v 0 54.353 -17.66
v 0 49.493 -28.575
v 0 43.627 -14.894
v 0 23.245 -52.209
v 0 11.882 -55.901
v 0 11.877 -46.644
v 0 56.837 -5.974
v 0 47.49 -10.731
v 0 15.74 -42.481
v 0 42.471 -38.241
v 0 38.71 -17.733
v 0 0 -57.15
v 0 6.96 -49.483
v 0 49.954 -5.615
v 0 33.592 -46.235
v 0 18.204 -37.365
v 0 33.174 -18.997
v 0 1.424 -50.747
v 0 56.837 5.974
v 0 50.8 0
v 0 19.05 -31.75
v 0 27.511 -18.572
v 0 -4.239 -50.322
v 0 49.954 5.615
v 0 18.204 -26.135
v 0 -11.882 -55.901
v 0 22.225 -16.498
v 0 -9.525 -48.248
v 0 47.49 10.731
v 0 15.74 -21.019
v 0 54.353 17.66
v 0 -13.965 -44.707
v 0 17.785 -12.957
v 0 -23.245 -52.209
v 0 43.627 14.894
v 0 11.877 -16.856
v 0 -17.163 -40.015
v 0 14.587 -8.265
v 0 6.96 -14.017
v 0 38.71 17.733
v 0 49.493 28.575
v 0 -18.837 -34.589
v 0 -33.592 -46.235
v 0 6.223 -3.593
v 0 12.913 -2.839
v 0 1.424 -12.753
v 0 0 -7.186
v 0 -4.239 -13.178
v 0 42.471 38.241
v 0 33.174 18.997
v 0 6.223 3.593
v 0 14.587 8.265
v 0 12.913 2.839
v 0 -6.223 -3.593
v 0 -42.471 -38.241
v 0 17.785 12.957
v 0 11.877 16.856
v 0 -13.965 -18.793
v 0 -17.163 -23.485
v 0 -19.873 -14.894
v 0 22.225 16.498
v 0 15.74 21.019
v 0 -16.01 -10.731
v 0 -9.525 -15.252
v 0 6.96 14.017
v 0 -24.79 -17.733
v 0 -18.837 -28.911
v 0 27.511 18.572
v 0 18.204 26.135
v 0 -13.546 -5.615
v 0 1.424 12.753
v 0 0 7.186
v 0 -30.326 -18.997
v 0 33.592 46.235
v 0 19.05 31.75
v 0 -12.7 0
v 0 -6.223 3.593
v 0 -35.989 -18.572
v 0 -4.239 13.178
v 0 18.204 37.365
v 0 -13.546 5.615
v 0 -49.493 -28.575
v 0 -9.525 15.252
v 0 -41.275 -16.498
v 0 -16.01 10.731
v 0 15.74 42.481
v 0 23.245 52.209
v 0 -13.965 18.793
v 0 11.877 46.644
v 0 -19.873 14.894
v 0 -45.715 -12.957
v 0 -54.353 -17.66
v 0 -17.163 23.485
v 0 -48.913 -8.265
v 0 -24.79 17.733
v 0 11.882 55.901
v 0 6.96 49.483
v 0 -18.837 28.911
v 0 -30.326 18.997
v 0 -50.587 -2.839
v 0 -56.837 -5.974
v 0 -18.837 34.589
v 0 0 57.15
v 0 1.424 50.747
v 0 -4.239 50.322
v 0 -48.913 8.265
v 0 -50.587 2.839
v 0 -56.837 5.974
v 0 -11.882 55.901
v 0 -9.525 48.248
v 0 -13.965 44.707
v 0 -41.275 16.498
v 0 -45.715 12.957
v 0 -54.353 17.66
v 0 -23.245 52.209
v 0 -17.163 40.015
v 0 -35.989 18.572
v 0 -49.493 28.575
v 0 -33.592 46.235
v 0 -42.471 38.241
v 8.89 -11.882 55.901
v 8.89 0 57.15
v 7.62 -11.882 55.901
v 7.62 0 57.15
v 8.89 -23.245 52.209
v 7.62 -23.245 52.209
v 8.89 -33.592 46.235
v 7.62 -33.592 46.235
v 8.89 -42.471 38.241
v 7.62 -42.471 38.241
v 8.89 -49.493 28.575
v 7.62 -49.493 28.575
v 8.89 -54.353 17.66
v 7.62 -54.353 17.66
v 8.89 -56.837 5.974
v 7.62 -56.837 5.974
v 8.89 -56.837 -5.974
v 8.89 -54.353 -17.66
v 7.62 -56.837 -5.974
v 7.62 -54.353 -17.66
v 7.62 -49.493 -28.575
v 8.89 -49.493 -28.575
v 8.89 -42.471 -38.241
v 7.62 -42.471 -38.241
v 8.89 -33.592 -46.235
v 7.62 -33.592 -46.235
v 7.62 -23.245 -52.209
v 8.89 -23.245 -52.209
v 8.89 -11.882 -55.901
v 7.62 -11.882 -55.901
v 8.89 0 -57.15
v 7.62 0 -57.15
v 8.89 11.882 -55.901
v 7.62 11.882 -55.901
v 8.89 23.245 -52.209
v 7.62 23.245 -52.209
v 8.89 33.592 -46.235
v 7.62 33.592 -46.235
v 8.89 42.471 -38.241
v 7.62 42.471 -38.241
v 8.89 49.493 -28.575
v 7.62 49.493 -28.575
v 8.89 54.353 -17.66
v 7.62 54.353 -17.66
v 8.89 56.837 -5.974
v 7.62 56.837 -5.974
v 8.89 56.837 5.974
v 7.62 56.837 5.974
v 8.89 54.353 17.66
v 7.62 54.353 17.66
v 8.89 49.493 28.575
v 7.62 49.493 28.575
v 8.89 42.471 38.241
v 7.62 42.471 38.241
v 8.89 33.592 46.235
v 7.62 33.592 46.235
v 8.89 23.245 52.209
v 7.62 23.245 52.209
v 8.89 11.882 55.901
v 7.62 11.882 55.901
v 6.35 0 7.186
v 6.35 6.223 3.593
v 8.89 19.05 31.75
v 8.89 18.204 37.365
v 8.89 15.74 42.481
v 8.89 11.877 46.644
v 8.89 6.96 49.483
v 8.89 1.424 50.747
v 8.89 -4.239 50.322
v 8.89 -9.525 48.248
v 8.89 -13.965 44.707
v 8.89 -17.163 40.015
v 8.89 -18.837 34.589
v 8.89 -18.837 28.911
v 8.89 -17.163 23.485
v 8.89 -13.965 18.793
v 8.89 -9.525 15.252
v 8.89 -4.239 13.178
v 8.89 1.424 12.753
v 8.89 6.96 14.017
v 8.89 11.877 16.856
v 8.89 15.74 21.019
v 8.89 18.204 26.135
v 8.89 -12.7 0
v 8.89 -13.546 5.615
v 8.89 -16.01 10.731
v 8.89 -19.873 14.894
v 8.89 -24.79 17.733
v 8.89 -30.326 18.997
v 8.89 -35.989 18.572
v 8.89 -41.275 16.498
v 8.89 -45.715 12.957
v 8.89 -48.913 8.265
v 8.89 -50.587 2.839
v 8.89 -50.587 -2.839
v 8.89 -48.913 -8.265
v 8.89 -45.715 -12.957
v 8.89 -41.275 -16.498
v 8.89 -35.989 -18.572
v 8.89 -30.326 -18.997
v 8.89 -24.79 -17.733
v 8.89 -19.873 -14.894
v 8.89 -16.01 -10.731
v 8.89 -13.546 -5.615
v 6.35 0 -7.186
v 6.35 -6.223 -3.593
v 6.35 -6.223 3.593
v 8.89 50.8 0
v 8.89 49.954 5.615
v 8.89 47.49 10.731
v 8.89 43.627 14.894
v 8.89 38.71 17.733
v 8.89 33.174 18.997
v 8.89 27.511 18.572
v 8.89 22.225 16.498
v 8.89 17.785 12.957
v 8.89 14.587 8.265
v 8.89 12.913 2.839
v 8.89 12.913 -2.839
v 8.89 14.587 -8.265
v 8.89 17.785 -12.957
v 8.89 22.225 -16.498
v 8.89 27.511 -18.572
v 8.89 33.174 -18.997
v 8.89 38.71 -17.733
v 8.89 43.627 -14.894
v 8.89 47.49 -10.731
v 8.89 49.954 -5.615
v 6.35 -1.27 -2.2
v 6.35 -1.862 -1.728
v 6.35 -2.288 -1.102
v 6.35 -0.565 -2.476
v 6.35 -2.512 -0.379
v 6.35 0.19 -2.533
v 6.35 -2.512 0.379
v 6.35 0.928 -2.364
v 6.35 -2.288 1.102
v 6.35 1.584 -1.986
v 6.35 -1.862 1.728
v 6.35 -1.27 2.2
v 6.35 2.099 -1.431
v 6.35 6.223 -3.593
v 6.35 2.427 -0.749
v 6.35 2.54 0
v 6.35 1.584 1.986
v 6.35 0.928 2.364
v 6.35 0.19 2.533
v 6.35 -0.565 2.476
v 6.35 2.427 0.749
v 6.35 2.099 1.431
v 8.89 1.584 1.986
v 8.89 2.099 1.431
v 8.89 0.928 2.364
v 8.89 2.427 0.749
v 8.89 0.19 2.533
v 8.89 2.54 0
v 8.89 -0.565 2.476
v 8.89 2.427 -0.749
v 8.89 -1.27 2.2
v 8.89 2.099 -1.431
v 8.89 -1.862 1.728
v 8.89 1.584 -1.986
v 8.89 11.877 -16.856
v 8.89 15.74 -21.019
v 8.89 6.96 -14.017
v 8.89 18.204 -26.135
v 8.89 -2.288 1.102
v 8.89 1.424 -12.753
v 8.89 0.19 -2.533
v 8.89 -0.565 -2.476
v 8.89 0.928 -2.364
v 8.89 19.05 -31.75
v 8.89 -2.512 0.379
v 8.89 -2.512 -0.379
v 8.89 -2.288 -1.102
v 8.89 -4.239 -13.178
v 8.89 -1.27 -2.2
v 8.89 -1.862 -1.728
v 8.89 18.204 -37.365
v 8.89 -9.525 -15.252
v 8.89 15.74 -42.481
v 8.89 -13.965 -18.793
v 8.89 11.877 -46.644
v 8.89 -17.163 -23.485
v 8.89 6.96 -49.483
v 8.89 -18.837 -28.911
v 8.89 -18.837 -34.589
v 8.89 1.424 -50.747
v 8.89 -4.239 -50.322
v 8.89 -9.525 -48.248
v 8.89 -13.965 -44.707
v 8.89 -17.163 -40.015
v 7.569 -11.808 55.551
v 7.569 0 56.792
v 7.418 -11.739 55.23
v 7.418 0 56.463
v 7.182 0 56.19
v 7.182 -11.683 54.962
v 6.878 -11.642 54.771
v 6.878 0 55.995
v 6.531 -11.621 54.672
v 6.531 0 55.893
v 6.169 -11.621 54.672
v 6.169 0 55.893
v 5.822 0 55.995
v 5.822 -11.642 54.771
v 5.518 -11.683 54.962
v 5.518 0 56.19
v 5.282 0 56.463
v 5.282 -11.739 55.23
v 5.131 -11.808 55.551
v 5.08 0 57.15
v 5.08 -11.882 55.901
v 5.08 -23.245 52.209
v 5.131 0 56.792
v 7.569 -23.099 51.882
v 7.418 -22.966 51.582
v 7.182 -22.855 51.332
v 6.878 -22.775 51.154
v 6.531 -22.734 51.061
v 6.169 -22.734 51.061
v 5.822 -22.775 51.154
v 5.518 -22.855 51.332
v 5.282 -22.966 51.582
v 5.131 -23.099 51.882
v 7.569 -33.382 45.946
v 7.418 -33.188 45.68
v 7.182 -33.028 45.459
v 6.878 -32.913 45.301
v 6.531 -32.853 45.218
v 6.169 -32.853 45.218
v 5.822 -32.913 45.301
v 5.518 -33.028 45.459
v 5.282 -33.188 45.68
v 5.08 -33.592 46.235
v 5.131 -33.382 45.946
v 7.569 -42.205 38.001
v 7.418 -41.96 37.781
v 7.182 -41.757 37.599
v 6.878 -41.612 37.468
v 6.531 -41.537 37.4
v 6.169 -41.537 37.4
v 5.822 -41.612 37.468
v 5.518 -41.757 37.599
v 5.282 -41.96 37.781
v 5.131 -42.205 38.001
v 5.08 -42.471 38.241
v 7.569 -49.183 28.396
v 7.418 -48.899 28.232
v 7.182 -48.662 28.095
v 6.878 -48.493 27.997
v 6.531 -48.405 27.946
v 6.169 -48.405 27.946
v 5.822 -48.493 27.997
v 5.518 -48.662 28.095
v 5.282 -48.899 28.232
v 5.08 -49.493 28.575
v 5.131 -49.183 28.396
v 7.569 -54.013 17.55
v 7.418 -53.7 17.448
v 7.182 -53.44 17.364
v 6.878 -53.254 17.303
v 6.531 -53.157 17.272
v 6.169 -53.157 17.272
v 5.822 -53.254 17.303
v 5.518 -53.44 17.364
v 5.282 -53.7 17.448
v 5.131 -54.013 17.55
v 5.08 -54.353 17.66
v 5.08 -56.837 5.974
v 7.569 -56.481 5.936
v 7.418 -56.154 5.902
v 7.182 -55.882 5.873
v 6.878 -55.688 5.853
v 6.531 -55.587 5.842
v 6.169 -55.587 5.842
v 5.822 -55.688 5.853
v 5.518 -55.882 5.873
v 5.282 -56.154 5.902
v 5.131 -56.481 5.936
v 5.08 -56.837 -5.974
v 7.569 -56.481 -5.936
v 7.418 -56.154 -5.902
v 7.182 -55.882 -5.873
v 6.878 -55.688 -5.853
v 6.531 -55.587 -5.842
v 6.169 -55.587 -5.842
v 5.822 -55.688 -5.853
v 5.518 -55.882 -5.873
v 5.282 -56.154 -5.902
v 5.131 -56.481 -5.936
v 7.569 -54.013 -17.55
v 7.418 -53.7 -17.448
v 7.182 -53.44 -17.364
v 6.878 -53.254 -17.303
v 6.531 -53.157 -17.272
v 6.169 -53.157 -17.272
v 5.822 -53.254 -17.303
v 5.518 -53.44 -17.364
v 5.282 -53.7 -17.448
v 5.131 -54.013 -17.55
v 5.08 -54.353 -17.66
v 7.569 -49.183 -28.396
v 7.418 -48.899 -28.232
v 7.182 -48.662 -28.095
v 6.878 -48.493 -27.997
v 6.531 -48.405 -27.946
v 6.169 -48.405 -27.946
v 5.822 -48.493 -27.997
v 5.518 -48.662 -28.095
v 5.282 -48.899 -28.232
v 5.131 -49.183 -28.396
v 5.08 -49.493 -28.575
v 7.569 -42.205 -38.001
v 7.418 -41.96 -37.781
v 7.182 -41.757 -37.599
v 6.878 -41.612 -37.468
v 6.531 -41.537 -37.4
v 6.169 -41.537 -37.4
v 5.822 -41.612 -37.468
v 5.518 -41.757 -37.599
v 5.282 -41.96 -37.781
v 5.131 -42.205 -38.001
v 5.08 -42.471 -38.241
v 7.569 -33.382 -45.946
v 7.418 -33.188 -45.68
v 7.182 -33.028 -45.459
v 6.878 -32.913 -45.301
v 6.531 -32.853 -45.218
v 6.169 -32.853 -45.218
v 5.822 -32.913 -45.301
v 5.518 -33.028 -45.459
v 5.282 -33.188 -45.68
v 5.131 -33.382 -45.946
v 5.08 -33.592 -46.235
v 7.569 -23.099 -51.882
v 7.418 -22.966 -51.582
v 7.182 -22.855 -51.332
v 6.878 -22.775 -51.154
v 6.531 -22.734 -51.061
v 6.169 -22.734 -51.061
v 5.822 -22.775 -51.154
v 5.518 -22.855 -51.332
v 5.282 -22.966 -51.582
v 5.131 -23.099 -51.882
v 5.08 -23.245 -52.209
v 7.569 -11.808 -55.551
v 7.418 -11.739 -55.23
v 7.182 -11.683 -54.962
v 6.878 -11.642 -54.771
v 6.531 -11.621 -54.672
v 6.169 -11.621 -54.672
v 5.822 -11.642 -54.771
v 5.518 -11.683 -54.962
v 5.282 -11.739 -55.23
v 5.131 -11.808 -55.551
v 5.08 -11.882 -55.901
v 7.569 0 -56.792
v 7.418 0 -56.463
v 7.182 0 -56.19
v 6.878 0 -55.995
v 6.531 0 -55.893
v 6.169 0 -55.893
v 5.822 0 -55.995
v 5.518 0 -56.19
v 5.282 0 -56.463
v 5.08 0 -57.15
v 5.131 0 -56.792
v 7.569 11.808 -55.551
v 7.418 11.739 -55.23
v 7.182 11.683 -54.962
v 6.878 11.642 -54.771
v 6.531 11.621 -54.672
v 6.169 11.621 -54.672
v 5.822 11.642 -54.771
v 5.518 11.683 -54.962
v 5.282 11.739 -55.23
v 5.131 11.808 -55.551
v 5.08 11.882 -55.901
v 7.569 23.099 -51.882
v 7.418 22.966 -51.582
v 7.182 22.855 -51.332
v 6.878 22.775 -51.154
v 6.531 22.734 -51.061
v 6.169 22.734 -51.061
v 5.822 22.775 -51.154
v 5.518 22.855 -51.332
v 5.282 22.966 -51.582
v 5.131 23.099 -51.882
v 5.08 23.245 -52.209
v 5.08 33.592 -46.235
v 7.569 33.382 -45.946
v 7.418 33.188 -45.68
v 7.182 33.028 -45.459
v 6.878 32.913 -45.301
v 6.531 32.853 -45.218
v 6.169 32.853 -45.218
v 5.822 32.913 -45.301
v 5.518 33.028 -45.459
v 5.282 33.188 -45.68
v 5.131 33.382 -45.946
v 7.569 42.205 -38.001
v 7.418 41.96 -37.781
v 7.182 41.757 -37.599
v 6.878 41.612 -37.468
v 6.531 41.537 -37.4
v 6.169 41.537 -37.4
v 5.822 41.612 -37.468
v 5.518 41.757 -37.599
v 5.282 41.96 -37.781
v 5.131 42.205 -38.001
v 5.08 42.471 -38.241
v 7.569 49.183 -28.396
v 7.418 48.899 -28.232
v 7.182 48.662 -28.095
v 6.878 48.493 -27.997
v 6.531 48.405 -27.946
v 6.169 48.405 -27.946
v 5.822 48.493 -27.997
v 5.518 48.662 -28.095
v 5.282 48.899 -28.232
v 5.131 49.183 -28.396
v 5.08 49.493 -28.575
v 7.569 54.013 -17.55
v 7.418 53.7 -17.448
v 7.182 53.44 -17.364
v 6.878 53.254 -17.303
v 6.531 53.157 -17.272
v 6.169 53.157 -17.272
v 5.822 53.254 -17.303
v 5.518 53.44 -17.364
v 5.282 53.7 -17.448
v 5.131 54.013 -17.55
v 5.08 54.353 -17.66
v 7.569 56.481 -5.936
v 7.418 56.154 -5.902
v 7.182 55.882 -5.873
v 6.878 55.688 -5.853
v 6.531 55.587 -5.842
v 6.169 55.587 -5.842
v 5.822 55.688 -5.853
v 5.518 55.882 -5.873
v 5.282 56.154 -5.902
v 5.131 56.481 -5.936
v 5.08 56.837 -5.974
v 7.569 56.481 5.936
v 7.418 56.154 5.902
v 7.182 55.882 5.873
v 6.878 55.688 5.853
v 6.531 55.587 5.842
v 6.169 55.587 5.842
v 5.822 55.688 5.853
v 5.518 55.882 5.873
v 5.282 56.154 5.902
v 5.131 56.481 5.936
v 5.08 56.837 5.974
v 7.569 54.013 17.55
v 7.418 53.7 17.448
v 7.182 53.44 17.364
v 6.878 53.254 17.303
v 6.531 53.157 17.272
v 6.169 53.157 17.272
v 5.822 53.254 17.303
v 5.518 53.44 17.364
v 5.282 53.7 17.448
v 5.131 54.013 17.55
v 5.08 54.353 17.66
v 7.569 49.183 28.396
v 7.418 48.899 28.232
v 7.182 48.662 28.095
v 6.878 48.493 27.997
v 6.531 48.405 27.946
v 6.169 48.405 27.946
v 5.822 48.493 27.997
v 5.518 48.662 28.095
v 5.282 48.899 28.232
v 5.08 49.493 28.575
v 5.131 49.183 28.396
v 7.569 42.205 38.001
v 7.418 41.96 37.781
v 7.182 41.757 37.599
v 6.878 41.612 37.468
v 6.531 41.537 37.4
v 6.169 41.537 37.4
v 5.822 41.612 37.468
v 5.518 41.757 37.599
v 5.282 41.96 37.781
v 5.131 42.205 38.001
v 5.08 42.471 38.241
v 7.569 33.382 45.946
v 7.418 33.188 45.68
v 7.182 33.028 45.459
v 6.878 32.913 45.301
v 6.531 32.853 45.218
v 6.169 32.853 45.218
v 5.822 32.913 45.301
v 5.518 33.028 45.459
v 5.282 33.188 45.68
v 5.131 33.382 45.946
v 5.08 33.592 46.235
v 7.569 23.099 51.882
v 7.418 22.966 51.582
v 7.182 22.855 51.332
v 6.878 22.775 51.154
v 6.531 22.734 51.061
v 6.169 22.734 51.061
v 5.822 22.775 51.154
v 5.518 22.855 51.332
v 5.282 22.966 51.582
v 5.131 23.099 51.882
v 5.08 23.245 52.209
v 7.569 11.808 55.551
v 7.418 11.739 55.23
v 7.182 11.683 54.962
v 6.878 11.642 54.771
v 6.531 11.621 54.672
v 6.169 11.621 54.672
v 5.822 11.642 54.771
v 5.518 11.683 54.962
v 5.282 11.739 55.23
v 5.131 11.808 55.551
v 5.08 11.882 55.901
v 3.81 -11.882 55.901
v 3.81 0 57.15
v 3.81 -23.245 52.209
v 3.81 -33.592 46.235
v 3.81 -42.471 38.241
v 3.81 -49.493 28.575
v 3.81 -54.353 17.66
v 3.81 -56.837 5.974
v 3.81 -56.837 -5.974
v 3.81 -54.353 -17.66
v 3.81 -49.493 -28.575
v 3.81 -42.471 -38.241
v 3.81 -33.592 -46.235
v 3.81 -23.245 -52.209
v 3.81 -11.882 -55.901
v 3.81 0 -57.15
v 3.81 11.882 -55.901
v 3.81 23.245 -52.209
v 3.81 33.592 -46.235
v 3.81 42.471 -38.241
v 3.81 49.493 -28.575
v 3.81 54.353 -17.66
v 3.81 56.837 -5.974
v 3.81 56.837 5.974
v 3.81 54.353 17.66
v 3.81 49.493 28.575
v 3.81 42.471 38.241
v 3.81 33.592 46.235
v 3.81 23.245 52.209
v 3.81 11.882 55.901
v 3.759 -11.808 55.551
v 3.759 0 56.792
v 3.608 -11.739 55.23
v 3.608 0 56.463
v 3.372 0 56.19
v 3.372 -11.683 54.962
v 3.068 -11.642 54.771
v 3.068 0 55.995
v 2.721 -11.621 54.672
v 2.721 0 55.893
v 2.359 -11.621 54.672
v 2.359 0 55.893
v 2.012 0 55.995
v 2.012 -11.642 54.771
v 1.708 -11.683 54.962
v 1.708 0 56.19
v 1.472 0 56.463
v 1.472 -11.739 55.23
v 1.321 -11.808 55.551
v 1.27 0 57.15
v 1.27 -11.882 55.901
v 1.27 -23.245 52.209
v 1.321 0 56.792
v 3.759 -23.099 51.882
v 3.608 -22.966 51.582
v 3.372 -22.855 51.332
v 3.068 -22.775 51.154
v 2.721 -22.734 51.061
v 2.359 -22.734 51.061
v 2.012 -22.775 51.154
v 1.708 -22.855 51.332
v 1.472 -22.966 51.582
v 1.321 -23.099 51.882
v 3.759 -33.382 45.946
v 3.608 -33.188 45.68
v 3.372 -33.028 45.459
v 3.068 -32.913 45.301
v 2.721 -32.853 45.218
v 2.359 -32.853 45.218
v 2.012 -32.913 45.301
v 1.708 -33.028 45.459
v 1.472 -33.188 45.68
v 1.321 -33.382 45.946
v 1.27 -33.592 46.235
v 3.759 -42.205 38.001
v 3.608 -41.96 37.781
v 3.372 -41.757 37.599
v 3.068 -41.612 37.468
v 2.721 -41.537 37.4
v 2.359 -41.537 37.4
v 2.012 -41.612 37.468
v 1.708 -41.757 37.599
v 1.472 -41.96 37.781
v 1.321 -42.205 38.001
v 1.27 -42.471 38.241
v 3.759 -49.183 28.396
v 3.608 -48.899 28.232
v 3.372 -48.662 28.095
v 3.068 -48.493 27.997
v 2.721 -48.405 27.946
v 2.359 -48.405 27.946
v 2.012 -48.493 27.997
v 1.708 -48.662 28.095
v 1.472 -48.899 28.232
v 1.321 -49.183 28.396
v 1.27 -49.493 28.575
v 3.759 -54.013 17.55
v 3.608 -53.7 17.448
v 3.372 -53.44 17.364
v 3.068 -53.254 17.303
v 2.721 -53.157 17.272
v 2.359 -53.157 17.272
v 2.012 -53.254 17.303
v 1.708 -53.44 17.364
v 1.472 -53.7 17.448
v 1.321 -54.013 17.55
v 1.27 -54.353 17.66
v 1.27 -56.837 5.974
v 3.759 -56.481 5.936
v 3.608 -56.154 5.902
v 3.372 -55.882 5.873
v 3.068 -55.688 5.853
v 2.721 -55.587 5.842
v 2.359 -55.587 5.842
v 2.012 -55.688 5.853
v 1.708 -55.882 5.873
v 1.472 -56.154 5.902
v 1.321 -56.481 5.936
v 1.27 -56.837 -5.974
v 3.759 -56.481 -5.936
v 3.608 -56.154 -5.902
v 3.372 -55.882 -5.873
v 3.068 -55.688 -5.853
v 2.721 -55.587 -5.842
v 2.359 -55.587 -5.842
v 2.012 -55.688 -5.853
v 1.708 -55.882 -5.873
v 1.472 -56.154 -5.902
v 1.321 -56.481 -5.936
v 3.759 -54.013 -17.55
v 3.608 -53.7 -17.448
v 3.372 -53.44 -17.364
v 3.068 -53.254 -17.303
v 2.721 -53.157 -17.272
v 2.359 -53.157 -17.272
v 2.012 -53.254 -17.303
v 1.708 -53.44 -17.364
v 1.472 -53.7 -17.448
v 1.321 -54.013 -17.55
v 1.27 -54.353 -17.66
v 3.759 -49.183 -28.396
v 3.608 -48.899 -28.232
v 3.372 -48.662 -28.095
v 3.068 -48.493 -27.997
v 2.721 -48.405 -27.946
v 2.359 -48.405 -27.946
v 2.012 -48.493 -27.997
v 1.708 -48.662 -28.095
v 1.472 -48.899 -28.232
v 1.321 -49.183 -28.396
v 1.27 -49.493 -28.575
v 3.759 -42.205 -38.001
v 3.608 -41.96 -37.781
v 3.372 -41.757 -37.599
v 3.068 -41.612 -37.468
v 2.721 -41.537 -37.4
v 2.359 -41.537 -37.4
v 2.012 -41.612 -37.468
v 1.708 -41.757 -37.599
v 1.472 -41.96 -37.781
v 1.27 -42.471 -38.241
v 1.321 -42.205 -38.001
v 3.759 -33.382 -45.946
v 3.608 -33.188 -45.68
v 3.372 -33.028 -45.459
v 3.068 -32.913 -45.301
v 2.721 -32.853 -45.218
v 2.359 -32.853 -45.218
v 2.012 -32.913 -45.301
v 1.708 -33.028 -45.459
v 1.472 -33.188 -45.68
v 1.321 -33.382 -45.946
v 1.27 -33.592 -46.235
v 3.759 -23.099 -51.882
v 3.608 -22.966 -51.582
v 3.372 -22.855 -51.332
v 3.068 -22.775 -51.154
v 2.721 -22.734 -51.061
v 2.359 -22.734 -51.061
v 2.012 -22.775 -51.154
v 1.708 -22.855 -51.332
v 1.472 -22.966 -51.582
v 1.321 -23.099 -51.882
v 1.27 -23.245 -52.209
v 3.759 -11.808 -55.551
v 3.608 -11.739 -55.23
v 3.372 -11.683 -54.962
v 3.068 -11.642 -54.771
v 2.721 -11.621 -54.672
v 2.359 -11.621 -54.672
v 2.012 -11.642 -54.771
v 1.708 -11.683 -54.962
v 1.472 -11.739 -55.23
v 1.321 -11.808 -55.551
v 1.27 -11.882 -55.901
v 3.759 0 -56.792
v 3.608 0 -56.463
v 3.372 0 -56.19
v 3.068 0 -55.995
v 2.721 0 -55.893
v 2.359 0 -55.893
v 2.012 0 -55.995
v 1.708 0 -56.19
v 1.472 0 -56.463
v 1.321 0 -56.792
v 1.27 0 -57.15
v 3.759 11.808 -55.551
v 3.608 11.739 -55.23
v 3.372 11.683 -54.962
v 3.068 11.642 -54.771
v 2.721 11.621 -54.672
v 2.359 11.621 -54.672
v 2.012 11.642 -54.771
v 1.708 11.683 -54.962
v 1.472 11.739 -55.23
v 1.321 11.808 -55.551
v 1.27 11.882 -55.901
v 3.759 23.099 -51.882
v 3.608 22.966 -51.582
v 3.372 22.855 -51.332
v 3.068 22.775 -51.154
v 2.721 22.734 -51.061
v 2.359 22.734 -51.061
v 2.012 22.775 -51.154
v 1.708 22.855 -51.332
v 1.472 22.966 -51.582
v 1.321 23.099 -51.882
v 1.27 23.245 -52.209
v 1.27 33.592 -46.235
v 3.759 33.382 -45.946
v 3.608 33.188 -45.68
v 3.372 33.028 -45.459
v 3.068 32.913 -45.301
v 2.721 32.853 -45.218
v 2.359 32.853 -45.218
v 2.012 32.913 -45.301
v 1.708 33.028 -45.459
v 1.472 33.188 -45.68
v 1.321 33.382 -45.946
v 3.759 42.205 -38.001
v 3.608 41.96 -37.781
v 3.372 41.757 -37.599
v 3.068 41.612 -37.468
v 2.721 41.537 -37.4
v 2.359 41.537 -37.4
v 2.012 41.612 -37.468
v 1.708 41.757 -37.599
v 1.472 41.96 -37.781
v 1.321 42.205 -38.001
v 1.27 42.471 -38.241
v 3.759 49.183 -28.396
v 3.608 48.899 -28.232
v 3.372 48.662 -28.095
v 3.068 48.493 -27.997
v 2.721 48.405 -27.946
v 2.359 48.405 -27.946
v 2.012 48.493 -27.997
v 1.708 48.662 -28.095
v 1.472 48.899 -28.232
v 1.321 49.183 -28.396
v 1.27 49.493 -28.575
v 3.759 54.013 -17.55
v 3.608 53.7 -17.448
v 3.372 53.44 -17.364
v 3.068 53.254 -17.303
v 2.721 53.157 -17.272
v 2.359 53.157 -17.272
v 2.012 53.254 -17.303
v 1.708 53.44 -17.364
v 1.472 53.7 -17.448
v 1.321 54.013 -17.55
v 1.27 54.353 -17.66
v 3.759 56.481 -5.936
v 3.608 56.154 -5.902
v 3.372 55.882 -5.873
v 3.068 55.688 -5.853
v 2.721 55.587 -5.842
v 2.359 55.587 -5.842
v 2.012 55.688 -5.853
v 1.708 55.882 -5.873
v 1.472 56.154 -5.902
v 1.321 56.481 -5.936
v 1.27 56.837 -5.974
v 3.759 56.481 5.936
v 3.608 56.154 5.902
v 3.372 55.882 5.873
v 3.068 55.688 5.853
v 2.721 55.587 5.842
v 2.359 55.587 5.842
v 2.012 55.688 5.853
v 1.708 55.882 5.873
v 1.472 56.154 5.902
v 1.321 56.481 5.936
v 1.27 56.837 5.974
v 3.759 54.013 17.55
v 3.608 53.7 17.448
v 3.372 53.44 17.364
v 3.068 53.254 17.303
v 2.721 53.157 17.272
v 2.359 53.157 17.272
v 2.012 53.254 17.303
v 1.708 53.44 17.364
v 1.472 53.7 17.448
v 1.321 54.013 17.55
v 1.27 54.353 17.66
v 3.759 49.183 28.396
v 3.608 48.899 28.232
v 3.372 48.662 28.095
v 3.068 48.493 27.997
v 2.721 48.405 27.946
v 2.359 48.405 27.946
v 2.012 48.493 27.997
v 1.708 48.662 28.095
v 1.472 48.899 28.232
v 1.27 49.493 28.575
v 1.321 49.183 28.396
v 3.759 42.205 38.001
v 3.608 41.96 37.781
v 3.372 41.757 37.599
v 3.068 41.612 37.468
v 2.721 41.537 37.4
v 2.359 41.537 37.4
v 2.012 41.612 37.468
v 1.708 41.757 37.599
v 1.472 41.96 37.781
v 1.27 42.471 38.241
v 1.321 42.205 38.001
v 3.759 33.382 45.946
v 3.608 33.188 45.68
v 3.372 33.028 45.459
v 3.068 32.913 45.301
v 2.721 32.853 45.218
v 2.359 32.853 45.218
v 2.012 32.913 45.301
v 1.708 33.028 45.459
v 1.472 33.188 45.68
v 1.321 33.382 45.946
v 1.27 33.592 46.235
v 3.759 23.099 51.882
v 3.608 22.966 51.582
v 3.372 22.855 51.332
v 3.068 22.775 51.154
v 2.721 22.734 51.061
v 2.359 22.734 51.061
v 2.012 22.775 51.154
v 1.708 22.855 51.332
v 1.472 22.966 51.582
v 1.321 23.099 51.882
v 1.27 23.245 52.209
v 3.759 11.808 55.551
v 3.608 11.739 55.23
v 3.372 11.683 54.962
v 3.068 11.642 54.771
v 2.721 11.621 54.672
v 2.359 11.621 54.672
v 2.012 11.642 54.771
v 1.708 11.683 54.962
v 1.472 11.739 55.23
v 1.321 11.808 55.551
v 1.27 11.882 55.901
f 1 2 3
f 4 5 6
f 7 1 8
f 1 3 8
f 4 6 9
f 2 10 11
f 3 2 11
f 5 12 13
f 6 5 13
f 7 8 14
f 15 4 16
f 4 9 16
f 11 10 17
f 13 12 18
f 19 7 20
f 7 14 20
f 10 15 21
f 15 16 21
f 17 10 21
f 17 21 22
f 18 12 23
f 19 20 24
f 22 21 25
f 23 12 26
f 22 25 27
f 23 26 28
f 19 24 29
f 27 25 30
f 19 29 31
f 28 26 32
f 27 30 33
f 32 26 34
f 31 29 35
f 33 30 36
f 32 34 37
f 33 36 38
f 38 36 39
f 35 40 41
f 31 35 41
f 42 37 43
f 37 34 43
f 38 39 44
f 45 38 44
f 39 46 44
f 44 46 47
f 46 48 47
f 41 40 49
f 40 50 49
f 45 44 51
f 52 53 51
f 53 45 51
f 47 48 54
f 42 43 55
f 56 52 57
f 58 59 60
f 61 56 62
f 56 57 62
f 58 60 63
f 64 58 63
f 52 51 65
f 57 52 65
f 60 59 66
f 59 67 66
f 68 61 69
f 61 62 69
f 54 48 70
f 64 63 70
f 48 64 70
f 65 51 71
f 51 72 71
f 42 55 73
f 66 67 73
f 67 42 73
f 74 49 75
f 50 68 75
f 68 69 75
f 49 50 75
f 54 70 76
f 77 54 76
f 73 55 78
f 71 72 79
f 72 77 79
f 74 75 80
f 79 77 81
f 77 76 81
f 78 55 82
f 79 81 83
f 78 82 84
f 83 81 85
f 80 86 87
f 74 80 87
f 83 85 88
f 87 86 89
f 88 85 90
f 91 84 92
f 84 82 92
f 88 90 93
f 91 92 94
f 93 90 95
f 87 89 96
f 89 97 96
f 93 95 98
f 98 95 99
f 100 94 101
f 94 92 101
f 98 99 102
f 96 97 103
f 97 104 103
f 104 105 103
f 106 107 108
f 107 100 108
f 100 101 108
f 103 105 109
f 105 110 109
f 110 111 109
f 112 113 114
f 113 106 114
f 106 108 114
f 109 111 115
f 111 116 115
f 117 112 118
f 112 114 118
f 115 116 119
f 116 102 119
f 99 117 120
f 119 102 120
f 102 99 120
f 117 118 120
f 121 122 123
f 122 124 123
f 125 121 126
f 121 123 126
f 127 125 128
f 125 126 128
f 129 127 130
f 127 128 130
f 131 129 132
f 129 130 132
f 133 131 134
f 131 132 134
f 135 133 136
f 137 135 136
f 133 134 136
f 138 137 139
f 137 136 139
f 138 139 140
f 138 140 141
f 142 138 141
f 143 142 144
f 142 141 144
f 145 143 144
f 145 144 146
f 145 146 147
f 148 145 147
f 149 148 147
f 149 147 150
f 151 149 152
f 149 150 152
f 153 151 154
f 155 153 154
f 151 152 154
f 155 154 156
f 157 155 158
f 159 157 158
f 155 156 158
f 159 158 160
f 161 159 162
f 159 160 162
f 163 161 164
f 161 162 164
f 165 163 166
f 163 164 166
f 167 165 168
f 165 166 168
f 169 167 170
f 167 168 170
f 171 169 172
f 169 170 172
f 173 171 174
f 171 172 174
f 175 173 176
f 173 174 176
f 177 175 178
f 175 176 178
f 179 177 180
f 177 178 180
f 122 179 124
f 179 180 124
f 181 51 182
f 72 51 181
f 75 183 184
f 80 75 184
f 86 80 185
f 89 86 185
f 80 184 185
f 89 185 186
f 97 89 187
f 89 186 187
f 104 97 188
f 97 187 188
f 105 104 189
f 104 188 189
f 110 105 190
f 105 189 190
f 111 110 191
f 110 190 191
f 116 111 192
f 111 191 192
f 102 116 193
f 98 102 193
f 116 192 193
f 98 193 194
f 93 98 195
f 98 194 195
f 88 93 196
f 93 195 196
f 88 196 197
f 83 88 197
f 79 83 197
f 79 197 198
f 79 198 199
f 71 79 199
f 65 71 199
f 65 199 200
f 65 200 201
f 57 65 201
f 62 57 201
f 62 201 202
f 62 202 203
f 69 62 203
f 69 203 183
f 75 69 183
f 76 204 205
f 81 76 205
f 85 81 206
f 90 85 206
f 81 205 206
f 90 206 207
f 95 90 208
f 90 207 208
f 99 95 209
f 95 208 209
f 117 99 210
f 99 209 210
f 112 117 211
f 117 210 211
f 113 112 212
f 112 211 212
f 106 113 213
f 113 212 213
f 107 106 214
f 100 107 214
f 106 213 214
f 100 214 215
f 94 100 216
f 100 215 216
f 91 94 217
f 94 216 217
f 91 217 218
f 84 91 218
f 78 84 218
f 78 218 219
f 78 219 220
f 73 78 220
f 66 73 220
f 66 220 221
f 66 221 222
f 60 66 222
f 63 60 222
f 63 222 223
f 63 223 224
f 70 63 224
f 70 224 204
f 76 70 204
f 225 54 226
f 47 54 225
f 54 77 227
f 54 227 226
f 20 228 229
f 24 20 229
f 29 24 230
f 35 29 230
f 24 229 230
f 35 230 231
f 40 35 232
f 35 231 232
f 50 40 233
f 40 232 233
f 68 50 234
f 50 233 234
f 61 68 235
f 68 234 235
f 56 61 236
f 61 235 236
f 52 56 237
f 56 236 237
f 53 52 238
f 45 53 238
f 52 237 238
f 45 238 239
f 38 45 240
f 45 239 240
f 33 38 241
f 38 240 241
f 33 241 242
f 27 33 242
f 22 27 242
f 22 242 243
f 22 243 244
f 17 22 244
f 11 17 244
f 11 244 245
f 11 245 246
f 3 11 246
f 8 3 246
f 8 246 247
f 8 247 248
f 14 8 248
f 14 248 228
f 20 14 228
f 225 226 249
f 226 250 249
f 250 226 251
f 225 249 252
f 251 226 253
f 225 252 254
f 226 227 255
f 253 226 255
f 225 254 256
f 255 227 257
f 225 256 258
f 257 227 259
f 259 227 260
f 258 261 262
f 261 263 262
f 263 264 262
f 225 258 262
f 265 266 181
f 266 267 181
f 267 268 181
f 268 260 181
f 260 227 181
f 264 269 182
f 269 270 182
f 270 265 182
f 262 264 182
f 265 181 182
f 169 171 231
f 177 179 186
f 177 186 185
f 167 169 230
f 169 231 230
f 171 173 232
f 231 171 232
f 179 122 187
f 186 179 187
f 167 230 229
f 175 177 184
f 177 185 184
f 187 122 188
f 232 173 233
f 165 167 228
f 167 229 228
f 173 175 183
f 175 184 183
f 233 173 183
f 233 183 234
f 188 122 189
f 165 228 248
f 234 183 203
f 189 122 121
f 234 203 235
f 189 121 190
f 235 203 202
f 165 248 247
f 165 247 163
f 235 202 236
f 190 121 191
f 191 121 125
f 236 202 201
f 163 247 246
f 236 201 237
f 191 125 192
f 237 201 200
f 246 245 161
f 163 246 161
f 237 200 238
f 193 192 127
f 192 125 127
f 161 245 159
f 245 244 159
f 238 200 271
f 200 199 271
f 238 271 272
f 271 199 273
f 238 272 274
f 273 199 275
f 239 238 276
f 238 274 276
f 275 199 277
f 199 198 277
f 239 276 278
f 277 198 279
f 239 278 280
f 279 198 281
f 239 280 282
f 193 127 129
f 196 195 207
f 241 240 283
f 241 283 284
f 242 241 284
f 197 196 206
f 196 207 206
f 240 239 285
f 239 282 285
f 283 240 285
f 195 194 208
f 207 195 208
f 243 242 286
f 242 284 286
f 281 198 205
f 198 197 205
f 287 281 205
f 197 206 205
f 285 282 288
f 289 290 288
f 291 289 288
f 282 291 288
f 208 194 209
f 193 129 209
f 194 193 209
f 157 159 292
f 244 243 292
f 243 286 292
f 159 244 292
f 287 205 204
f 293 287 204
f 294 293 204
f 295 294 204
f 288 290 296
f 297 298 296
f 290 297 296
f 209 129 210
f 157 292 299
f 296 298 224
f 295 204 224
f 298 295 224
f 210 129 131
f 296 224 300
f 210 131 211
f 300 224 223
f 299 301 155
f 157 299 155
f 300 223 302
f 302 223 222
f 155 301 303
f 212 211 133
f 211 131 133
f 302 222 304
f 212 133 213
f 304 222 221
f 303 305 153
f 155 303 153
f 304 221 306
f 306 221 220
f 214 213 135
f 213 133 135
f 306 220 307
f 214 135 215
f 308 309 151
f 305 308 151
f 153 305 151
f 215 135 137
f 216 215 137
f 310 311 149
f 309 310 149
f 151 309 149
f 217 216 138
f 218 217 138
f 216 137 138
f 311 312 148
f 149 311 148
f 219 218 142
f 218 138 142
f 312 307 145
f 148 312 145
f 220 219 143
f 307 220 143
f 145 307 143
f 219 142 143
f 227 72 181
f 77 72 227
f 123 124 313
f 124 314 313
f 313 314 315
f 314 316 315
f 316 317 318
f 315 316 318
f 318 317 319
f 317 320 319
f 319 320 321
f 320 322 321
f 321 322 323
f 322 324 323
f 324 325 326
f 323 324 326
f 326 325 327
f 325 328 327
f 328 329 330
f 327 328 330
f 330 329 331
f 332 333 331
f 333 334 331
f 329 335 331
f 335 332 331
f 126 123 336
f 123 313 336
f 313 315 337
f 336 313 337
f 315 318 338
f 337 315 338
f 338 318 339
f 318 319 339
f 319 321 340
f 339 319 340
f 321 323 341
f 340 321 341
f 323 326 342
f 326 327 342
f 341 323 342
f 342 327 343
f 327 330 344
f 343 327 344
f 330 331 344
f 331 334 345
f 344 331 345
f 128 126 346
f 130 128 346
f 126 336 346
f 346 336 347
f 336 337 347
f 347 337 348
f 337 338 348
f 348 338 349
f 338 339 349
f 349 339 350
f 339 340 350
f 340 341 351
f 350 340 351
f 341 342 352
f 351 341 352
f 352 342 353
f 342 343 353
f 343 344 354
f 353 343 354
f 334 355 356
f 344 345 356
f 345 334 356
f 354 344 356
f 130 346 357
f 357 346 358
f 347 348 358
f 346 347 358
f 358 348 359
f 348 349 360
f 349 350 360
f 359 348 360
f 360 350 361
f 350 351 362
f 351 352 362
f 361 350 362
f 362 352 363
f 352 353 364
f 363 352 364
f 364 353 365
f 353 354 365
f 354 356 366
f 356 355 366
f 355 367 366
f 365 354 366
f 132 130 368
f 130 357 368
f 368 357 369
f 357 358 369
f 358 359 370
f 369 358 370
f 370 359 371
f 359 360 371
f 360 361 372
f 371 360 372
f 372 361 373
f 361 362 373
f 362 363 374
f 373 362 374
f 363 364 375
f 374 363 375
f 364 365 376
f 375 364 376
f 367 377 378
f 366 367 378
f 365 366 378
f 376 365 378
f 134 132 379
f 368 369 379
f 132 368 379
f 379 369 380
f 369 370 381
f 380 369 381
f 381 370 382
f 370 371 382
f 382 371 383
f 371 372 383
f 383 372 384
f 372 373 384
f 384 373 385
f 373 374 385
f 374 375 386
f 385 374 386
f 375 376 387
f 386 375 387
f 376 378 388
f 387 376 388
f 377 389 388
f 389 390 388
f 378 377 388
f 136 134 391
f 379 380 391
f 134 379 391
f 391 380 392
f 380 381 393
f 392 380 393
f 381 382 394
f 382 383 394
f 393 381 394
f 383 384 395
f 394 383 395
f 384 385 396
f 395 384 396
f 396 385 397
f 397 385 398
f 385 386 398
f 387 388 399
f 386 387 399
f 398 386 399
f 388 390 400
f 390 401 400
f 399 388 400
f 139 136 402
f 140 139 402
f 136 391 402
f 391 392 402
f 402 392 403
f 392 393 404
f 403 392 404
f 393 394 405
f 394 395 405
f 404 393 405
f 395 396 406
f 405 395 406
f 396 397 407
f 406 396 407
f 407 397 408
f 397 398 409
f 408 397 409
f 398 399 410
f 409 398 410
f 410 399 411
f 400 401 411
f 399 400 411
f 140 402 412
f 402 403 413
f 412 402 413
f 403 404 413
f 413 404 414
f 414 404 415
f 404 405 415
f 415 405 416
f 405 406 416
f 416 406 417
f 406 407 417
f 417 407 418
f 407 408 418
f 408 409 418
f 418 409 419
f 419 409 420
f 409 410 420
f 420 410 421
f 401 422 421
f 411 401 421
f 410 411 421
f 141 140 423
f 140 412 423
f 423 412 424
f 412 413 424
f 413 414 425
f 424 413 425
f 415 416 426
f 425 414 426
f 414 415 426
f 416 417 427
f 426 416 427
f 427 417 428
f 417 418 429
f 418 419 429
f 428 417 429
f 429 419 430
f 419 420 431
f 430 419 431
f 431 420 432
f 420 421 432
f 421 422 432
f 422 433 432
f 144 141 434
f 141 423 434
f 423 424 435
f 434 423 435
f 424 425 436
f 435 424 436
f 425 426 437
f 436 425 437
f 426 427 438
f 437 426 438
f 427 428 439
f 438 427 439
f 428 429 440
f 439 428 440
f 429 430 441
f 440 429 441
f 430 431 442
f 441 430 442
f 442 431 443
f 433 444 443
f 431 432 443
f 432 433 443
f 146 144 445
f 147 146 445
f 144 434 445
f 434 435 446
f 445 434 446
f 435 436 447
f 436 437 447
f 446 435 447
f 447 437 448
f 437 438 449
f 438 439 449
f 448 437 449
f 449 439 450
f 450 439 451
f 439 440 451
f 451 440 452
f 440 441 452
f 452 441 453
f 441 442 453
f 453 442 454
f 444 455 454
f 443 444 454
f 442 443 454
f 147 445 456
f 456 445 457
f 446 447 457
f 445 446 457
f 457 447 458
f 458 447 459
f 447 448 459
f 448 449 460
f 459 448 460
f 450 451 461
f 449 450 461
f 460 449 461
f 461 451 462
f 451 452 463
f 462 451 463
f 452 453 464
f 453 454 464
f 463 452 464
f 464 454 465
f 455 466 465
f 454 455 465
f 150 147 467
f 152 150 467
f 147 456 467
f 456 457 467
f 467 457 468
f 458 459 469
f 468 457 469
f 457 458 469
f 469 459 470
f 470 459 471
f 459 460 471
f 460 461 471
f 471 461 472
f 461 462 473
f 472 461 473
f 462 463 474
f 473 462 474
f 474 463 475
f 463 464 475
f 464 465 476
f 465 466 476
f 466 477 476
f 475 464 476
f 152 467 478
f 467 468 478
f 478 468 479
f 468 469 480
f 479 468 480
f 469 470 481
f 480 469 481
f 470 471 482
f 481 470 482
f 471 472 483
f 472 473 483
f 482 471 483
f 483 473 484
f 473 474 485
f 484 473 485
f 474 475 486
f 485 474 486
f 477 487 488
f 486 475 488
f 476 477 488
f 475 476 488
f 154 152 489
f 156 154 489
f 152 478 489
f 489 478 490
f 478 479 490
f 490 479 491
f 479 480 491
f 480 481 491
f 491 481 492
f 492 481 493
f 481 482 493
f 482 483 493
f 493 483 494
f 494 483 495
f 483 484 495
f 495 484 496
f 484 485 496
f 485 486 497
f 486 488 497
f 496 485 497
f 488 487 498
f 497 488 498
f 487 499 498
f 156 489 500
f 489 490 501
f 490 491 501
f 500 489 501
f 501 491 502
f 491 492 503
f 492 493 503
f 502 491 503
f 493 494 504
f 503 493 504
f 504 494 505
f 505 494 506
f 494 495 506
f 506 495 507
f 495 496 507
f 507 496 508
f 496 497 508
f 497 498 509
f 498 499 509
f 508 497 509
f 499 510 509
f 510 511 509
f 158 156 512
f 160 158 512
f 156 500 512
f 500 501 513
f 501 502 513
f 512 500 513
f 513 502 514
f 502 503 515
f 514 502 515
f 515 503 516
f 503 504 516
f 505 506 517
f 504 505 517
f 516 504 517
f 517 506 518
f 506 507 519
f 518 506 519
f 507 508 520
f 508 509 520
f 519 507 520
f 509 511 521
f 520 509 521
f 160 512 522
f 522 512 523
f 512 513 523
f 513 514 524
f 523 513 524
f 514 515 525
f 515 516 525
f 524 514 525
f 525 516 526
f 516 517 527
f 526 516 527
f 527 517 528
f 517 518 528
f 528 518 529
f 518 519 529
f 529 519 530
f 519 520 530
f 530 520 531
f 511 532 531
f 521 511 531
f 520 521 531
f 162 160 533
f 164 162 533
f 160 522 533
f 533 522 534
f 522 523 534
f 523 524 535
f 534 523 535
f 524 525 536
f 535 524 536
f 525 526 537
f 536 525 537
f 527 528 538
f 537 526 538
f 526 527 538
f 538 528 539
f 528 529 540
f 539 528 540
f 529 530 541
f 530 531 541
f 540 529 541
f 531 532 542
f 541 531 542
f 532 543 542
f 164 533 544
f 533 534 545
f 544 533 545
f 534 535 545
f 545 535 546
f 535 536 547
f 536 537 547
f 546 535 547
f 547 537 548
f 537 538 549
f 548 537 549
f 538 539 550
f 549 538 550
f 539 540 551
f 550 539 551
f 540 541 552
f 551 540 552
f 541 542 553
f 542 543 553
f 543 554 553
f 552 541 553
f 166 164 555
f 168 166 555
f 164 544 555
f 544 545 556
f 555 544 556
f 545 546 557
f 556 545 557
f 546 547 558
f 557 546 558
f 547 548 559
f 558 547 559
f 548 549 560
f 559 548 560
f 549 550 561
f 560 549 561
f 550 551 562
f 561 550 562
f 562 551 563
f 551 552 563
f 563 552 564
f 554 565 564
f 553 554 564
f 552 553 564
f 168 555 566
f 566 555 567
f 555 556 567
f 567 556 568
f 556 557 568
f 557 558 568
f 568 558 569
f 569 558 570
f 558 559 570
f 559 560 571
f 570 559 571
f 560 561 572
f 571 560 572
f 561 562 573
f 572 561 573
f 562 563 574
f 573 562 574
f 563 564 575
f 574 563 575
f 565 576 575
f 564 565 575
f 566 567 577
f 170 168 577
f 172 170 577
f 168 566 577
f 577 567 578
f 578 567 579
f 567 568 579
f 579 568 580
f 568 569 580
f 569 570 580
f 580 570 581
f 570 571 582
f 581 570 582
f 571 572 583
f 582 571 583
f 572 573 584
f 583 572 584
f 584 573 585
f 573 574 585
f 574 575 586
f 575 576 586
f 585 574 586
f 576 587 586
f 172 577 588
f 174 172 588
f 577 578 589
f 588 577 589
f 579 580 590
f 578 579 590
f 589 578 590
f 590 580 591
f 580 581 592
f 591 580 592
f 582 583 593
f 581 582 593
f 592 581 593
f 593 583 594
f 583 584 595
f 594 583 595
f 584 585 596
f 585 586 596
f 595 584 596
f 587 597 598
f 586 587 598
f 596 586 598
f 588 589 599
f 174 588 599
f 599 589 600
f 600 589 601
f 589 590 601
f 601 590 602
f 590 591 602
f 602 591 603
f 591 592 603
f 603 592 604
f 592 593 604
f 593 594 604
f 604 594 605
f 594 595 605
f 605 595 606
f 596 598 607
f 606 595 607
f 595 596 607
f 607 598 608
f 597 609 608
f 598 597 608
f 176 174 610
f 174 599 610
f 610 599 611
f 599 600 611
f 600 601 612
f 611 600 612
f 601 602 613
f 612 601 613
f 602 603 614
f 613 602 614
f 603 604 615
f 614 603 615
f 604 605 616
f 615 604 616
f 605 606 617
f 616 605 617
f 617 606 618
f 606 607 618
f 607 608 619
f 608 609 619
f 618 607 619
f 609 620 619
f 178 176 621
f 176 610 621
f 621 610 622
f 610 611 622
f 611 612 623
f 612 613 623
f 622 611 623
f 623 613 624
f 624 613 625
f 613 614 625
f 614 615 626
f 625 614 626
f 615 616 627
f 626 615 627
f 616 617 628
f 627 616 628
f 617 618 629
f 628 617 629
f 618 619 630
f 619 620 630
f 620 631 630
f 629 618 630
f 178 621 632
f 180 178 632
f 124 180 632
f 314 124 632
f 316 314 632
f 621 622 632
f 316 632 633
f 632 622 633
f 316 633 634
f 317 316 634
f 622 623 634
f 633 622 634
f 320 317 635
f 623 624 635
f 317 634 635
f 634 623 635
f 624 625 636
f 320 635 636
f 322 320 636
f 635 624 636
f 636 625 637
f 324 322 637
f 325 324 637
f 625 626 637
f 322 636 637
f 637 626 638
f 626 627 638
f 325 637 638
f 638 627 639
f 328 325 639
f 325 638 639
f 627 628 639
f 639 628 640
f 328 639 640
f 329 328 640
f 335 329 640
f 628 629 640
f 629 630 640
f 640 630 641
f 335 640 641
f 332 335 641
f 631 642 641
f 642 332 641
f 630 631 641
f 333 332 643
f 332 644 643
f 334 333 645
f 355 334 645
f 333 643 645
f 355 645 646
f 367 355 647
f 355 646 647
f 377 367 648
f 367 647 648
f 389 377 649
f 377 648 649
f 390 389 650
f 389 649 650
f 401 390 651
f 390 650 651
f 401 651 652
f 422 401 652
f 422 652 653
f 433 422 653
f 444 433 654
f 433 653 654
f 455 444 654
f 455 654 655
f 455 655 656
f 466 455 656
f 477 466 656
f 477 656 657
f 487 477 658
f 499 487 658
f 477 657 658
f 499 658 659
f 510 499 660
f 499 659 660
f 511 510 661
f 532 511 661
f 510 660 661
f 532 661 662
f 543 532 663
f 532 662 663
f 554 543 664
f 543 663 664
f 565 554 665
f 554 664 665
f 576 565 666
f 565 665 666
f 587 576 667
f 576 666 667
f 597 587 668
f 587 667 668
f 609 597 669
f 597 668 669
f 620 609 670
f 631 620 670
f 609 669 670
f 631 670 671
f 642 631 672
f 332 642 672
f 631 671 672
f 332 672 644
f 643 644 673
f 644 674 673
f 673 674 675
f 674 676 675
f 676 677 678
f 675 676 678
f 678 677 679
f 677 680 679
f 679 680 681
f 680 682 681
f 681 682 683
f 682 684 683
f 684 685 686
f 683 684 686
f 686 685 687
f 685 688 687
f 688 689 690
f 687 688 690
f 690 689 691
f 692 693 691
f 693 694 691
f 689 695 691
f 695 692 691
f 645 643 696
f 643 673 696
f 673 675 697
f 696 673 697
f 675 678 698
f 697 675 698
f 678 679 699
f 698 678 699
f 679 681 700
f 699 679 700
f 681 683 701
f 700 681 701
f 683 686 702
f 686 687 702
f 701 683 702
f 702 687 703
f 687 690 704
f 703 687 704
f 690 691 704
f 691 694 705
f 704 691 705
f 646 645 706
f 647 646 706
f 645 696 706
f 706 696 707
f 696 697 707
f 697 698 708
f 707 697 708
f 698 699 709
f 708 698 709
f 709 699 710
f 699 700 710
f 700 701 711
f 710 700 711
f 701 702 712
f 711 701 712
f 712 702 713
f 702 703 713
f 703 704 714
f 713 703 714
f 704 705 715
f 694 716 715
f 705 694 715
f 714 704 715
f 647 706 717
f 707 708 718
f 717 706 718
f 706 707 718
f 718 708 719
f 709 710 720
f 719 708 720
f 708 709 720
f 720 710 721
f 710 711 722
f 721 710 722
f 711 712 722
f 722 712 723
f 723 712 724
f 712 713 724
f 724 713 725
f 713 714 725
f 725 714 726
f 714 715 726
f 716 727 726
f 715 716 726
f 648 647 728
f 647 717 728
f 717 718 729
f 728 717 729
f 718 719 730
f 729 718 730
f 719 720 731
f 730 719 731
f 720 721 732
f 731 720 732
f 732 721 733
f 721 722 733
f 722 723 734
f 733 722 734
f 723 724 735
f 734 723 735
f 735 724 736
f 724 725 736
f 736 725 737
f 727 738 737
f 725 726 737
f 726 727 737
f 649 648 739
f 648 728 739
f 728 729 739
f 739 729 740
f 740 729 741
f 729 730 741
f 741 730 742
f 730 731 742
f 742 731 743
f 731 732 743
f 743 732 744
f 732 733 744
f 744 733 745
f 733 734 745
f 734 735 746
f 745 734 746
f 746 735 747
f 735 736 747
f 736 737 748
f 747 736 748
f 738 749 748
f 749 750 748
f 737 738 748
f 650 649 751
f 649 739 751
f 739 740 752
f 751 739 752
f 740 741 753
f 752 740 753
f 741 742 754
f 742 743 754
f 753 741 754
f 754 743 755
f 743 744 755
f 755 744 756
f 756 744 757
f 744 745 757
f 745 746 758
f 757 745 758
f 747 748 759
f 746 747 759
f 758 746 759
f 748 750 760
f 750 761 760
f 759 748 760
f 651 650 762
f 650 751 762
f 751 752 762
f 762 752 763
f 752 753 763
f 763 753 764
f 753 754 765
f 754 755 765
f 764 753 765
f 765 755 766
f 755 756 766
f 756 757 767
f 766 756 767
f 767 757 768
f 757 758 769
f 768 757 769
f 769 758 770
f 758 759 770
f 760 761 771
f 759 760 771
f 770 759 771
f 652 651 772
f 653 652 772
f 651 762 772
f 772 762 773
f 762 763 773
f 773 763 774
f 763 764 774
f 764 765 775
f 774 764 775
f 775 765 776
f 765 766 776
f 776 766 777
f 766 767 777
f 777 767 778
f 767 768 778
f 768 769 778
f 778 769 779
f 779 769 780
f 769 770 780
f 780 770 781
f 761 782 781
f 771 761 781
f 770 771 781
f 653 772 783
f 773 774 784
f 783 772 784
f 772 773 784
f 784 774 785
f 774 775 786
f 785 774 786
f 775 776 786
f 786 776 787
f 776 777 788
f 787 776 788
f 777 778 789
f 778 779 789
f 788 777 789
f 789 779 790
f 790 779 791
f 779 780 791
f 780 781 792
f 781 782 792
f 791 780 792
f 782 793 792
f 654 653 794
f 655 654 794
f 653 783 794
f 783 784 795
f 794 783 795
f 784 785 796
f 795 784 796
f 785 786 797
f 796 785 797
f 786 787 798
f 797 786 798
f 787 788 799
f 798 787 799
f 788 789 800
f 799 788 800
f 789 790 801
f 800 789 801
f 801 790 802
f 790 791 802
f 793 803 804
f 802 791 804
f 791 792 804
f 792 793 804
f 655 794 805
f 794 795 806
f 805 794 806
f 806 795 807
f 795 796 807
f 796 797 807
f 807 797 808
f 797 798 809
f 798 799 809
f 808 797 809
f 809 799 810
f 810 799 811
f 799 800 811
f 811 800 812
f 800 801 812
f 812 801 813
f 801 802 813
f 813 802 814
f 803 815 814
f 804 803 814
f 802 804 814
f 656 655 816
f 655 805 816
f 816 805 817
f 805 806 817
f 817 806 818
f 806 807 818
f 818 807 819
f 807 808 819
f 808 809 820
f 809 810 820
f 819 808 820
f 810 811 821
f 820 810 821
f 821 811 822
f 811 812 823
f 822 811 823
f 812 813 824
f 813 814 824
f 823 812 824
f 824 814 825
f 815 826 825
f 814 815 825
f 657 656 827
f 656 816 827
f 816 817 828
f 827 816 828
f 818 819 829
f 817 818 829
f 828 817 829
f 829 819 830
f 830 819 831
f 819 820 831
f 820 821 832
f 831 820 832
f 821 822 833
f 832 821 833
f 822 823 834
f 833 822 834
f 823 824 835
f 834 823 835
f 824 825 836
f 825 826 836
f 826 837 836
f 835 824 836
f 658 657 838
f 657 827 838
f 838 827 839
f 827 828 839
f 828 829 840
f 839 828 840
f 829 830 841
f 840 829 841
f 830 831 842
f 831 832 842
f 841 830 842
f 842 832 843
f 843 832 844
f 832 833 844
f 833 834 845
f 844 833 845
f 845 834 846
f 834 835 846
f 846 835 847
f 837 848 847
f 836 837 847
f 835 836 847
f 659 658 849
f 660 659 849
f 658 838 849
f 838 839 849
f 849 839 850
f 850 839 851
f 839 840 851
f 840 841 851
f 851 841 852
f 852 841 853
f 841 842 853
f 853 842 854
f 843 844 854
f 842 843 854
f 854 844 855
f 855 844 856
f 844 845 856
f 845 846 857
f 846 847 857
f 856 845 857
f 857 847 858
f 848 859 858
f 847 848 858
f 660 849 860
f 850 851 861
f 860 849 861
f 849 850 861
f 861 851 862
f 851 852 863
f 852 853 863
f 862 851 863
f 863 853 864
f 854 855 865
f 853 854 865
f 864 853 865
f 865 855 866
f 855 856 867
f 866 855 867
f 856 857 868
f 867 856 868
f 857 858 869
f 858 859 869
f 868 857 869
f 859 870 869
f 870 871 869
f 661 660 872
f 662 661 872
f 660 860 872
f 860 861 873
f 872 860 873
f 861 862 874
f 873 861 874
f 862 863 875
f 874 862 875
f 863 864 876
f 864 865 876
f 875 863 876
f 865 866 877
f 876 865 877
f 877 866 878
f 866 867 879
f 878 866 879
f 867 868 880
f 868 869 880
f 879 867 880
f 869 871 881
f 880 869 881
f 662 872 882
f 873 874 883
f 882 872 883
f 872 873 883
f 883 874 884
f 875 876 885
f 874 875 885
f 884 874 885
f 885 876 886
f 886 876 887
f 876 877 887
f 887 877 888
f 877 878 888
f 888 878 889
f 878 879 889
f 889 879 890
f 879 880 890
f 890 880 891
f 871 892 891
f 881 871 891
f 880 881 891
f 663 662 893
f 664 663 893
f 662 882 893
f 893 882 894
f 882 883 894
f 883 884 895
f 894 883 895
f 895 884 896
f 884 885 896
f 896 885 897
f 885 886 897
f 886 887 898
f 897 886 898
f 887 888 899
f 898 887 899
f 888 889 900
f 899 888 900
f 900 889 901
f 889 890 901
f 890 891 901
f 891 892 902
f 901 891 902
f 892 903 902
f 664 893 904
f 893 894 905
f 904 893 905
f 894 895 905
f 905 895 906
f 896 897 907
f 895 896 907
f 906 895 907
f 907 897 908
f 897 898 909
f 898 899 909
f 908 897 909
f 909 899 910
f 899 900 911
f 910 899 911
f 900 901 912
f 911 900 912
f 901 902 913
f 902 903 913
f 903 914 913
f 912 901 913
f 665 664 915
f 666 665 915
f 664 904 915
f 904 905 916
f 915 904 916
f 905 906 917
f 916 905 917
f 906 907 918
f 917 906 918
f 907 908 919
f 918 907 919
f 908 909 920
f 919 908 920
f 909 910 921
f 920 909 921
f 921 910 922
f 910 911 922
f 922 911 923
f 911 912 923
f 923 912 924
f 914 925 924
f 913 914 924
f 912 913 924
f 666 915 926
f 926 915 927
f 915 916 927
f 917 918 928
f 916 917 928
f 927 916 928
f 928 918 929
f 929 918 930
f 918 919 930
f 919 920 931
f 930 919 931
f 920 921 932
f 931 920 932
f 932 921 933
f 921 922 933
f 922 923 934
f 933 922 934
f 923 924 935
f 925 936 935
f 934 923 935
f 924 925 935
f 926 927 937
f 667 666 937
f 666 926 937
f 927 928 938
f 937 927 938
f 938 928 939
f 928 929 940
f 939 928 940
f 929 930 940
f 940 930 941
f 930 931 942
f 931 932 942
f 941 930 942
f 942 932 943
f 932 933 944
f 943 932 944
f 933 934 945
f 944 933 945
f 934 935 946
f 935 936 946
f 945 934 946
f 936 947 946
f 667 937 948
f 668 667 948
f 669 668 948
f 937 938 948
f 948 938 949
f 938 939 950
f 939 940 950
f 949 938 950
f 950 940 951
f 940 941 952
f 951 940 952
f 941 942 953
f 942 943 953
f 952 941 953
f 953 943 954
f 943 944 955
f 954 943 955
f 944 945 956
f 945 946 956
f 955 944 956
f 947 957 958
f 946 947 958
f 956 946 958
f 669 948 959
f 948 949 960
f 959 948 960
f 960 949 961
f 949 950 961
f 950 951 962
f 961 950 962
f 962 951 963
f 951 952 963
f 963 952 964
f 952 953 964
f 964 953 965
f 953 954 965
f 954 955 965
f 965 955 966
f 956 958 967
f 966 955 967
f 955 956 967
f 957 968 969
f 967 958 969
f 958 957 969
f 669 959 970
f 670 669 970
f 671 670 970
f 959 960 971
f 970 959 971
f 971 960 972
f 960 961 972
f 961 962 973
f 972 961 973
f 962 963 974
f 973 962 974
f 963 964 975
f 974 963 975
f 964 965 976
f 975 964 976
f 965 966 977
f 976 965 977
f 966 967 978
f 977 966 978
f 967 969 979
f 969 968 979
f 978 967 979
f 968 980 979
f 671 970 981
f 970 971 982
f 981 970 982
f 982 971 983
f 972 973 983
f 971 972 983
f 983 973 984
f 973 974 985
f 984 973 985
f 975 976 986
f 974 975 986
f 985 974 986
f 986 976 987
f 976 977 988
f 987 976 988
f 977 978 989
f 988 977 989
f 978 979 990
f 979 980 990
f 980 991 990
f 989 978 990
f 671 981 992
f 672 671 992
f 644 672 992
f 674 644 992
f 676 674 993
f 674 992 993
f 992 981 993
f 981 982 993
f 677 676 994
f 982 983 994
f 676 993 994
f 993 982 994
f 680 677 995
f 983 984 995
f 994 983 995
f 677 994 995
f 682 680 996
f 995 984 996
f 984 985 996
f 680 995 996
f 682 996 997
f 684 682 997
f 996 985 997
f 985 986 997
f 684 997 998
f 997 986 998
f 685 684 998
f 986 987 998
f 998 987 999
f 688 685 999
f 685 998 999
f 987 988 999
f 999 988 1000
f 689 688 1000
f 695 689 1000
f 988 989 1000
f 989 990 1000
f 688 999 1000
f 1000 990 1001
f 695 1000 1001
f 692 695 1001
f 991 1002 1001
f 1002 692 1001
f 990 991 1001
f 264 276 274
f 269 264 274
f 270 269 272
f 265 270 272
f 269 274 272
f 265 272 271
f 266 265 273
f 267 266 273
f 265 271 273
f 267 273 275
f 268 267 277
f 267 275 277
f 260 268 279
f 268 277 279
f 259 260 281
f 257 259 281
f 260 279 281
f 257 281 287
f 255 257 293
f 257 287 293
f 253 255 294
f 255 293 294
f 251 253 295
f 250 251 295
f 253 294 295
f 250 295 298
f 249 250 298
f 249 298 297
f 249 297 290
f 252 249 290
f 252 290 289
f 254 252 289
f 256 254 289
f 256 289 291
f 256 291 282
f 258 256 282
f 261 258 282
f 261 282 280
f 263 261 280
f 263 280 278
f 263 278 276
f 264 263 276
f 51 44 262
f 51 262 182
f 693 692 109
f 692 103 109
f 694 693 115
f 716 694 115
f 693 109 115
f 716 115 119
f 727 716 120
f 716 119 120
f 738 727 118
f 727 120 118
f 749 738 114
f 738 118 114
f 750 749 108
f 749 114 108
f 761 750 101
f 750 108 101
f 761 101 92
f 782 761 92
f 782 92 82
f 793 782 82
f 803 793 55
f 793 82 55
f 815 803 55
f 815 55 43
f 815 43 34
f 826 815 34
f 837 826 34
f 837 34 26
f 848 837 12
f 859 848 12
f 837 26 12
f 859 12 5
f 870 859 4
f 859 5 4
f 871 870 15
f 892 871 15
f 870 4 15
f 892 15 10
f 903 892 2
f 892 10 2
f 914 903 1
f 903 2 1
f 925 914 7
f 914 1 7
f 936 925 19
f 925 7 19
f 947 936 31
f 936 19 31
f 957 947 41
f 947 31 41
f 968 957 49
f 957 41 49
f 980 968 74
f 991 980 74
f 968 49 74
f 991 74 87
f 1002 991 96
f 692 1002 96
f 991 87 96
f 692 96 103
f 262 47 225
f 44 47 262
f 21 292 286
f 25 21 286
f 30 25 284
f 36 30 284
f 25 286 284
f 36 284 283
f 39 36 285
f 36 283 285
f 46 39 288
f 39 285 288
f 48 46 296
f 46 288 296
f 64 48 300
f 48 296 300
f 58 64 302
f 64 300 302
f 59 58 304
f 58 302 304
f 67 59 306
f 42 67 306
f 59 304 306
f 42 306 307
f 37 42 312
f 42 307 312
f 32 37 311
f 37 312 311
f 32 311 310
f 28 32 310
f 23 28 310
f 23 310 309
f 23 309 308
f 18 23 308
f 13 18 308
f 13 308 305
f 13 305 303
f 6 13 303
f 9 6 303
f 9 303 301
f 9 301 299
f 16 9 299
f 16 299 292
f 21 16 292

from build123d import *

# Parameters (mm, degrees)
F3_R     = 19.05
F4_DEPTH = 19.05
F6_DEPTH = 6.35
F7_R     = 2.54
F8_DEPTH = 8.891


with BuildPart() as f1:
    # F0 (on Front) → F1 (revolve)
    with BuildSketch(Plane.XZ):
        with BuildLine():
            Line((0, 57.15), (0, 0))
            Line((0, 0), (8.89, 0))
            Line((8.89, 0), (8.89, 57.15))
            Line((8.89, 57.15), (7.62, 57.15))
            ThreePointArc((7.62, 57.15), (6.35, 55.88), (5.08, 57.15))
            Line((5.08, 57.15), (3.81, 57.15))
            ThreePointArc((3.81, 57.15), (2.54, 55.88), (1.27, 57.15))
            Line((1.27, 57.15), (0, 57.15))
        make_face()
    revolve(axis=Axis((4.445, 0, 0), (1, 0, 0)))

    # F3 (on face) → F4 (cut)
    with BuildSketch(Plane.YZ.offset(8.89)):
        with Locations((-31.75, 0)):
            Circle(F3_R)
        with Locations((0, 31.75)):
            Circle(F3_R)
        with Locations((31.75, 0)):
            Circle(F3_R)
        with Locations((0, -31.75)):
            Circle(F3_R)
    extrude(amount=-F4_DEPTH, mode=Mode.SUBTRACT)

    # F5 (on Right) → F6 (cut)
    with BuildSketch(Plane.YZ):
        Polygon((-6.223, 3.592851), (-6.223, -3.592851), (0, -7.185701), (6.223, -3.592851), (6.223, 3.592851), (0, 7.185701), align=None)
    extrude(amount=F6_DEPTH, mode=Mode.SUBTRACT)

    # F7 (on face) → F8 (cut, through all)
    with BuildSketch(Plane.YZ.offset(8.89)):
        Circle(F7_R)
    extrude(amount=-F8_DEPTH, mode=Mode.SUBTRACT)


solid = f1.part
